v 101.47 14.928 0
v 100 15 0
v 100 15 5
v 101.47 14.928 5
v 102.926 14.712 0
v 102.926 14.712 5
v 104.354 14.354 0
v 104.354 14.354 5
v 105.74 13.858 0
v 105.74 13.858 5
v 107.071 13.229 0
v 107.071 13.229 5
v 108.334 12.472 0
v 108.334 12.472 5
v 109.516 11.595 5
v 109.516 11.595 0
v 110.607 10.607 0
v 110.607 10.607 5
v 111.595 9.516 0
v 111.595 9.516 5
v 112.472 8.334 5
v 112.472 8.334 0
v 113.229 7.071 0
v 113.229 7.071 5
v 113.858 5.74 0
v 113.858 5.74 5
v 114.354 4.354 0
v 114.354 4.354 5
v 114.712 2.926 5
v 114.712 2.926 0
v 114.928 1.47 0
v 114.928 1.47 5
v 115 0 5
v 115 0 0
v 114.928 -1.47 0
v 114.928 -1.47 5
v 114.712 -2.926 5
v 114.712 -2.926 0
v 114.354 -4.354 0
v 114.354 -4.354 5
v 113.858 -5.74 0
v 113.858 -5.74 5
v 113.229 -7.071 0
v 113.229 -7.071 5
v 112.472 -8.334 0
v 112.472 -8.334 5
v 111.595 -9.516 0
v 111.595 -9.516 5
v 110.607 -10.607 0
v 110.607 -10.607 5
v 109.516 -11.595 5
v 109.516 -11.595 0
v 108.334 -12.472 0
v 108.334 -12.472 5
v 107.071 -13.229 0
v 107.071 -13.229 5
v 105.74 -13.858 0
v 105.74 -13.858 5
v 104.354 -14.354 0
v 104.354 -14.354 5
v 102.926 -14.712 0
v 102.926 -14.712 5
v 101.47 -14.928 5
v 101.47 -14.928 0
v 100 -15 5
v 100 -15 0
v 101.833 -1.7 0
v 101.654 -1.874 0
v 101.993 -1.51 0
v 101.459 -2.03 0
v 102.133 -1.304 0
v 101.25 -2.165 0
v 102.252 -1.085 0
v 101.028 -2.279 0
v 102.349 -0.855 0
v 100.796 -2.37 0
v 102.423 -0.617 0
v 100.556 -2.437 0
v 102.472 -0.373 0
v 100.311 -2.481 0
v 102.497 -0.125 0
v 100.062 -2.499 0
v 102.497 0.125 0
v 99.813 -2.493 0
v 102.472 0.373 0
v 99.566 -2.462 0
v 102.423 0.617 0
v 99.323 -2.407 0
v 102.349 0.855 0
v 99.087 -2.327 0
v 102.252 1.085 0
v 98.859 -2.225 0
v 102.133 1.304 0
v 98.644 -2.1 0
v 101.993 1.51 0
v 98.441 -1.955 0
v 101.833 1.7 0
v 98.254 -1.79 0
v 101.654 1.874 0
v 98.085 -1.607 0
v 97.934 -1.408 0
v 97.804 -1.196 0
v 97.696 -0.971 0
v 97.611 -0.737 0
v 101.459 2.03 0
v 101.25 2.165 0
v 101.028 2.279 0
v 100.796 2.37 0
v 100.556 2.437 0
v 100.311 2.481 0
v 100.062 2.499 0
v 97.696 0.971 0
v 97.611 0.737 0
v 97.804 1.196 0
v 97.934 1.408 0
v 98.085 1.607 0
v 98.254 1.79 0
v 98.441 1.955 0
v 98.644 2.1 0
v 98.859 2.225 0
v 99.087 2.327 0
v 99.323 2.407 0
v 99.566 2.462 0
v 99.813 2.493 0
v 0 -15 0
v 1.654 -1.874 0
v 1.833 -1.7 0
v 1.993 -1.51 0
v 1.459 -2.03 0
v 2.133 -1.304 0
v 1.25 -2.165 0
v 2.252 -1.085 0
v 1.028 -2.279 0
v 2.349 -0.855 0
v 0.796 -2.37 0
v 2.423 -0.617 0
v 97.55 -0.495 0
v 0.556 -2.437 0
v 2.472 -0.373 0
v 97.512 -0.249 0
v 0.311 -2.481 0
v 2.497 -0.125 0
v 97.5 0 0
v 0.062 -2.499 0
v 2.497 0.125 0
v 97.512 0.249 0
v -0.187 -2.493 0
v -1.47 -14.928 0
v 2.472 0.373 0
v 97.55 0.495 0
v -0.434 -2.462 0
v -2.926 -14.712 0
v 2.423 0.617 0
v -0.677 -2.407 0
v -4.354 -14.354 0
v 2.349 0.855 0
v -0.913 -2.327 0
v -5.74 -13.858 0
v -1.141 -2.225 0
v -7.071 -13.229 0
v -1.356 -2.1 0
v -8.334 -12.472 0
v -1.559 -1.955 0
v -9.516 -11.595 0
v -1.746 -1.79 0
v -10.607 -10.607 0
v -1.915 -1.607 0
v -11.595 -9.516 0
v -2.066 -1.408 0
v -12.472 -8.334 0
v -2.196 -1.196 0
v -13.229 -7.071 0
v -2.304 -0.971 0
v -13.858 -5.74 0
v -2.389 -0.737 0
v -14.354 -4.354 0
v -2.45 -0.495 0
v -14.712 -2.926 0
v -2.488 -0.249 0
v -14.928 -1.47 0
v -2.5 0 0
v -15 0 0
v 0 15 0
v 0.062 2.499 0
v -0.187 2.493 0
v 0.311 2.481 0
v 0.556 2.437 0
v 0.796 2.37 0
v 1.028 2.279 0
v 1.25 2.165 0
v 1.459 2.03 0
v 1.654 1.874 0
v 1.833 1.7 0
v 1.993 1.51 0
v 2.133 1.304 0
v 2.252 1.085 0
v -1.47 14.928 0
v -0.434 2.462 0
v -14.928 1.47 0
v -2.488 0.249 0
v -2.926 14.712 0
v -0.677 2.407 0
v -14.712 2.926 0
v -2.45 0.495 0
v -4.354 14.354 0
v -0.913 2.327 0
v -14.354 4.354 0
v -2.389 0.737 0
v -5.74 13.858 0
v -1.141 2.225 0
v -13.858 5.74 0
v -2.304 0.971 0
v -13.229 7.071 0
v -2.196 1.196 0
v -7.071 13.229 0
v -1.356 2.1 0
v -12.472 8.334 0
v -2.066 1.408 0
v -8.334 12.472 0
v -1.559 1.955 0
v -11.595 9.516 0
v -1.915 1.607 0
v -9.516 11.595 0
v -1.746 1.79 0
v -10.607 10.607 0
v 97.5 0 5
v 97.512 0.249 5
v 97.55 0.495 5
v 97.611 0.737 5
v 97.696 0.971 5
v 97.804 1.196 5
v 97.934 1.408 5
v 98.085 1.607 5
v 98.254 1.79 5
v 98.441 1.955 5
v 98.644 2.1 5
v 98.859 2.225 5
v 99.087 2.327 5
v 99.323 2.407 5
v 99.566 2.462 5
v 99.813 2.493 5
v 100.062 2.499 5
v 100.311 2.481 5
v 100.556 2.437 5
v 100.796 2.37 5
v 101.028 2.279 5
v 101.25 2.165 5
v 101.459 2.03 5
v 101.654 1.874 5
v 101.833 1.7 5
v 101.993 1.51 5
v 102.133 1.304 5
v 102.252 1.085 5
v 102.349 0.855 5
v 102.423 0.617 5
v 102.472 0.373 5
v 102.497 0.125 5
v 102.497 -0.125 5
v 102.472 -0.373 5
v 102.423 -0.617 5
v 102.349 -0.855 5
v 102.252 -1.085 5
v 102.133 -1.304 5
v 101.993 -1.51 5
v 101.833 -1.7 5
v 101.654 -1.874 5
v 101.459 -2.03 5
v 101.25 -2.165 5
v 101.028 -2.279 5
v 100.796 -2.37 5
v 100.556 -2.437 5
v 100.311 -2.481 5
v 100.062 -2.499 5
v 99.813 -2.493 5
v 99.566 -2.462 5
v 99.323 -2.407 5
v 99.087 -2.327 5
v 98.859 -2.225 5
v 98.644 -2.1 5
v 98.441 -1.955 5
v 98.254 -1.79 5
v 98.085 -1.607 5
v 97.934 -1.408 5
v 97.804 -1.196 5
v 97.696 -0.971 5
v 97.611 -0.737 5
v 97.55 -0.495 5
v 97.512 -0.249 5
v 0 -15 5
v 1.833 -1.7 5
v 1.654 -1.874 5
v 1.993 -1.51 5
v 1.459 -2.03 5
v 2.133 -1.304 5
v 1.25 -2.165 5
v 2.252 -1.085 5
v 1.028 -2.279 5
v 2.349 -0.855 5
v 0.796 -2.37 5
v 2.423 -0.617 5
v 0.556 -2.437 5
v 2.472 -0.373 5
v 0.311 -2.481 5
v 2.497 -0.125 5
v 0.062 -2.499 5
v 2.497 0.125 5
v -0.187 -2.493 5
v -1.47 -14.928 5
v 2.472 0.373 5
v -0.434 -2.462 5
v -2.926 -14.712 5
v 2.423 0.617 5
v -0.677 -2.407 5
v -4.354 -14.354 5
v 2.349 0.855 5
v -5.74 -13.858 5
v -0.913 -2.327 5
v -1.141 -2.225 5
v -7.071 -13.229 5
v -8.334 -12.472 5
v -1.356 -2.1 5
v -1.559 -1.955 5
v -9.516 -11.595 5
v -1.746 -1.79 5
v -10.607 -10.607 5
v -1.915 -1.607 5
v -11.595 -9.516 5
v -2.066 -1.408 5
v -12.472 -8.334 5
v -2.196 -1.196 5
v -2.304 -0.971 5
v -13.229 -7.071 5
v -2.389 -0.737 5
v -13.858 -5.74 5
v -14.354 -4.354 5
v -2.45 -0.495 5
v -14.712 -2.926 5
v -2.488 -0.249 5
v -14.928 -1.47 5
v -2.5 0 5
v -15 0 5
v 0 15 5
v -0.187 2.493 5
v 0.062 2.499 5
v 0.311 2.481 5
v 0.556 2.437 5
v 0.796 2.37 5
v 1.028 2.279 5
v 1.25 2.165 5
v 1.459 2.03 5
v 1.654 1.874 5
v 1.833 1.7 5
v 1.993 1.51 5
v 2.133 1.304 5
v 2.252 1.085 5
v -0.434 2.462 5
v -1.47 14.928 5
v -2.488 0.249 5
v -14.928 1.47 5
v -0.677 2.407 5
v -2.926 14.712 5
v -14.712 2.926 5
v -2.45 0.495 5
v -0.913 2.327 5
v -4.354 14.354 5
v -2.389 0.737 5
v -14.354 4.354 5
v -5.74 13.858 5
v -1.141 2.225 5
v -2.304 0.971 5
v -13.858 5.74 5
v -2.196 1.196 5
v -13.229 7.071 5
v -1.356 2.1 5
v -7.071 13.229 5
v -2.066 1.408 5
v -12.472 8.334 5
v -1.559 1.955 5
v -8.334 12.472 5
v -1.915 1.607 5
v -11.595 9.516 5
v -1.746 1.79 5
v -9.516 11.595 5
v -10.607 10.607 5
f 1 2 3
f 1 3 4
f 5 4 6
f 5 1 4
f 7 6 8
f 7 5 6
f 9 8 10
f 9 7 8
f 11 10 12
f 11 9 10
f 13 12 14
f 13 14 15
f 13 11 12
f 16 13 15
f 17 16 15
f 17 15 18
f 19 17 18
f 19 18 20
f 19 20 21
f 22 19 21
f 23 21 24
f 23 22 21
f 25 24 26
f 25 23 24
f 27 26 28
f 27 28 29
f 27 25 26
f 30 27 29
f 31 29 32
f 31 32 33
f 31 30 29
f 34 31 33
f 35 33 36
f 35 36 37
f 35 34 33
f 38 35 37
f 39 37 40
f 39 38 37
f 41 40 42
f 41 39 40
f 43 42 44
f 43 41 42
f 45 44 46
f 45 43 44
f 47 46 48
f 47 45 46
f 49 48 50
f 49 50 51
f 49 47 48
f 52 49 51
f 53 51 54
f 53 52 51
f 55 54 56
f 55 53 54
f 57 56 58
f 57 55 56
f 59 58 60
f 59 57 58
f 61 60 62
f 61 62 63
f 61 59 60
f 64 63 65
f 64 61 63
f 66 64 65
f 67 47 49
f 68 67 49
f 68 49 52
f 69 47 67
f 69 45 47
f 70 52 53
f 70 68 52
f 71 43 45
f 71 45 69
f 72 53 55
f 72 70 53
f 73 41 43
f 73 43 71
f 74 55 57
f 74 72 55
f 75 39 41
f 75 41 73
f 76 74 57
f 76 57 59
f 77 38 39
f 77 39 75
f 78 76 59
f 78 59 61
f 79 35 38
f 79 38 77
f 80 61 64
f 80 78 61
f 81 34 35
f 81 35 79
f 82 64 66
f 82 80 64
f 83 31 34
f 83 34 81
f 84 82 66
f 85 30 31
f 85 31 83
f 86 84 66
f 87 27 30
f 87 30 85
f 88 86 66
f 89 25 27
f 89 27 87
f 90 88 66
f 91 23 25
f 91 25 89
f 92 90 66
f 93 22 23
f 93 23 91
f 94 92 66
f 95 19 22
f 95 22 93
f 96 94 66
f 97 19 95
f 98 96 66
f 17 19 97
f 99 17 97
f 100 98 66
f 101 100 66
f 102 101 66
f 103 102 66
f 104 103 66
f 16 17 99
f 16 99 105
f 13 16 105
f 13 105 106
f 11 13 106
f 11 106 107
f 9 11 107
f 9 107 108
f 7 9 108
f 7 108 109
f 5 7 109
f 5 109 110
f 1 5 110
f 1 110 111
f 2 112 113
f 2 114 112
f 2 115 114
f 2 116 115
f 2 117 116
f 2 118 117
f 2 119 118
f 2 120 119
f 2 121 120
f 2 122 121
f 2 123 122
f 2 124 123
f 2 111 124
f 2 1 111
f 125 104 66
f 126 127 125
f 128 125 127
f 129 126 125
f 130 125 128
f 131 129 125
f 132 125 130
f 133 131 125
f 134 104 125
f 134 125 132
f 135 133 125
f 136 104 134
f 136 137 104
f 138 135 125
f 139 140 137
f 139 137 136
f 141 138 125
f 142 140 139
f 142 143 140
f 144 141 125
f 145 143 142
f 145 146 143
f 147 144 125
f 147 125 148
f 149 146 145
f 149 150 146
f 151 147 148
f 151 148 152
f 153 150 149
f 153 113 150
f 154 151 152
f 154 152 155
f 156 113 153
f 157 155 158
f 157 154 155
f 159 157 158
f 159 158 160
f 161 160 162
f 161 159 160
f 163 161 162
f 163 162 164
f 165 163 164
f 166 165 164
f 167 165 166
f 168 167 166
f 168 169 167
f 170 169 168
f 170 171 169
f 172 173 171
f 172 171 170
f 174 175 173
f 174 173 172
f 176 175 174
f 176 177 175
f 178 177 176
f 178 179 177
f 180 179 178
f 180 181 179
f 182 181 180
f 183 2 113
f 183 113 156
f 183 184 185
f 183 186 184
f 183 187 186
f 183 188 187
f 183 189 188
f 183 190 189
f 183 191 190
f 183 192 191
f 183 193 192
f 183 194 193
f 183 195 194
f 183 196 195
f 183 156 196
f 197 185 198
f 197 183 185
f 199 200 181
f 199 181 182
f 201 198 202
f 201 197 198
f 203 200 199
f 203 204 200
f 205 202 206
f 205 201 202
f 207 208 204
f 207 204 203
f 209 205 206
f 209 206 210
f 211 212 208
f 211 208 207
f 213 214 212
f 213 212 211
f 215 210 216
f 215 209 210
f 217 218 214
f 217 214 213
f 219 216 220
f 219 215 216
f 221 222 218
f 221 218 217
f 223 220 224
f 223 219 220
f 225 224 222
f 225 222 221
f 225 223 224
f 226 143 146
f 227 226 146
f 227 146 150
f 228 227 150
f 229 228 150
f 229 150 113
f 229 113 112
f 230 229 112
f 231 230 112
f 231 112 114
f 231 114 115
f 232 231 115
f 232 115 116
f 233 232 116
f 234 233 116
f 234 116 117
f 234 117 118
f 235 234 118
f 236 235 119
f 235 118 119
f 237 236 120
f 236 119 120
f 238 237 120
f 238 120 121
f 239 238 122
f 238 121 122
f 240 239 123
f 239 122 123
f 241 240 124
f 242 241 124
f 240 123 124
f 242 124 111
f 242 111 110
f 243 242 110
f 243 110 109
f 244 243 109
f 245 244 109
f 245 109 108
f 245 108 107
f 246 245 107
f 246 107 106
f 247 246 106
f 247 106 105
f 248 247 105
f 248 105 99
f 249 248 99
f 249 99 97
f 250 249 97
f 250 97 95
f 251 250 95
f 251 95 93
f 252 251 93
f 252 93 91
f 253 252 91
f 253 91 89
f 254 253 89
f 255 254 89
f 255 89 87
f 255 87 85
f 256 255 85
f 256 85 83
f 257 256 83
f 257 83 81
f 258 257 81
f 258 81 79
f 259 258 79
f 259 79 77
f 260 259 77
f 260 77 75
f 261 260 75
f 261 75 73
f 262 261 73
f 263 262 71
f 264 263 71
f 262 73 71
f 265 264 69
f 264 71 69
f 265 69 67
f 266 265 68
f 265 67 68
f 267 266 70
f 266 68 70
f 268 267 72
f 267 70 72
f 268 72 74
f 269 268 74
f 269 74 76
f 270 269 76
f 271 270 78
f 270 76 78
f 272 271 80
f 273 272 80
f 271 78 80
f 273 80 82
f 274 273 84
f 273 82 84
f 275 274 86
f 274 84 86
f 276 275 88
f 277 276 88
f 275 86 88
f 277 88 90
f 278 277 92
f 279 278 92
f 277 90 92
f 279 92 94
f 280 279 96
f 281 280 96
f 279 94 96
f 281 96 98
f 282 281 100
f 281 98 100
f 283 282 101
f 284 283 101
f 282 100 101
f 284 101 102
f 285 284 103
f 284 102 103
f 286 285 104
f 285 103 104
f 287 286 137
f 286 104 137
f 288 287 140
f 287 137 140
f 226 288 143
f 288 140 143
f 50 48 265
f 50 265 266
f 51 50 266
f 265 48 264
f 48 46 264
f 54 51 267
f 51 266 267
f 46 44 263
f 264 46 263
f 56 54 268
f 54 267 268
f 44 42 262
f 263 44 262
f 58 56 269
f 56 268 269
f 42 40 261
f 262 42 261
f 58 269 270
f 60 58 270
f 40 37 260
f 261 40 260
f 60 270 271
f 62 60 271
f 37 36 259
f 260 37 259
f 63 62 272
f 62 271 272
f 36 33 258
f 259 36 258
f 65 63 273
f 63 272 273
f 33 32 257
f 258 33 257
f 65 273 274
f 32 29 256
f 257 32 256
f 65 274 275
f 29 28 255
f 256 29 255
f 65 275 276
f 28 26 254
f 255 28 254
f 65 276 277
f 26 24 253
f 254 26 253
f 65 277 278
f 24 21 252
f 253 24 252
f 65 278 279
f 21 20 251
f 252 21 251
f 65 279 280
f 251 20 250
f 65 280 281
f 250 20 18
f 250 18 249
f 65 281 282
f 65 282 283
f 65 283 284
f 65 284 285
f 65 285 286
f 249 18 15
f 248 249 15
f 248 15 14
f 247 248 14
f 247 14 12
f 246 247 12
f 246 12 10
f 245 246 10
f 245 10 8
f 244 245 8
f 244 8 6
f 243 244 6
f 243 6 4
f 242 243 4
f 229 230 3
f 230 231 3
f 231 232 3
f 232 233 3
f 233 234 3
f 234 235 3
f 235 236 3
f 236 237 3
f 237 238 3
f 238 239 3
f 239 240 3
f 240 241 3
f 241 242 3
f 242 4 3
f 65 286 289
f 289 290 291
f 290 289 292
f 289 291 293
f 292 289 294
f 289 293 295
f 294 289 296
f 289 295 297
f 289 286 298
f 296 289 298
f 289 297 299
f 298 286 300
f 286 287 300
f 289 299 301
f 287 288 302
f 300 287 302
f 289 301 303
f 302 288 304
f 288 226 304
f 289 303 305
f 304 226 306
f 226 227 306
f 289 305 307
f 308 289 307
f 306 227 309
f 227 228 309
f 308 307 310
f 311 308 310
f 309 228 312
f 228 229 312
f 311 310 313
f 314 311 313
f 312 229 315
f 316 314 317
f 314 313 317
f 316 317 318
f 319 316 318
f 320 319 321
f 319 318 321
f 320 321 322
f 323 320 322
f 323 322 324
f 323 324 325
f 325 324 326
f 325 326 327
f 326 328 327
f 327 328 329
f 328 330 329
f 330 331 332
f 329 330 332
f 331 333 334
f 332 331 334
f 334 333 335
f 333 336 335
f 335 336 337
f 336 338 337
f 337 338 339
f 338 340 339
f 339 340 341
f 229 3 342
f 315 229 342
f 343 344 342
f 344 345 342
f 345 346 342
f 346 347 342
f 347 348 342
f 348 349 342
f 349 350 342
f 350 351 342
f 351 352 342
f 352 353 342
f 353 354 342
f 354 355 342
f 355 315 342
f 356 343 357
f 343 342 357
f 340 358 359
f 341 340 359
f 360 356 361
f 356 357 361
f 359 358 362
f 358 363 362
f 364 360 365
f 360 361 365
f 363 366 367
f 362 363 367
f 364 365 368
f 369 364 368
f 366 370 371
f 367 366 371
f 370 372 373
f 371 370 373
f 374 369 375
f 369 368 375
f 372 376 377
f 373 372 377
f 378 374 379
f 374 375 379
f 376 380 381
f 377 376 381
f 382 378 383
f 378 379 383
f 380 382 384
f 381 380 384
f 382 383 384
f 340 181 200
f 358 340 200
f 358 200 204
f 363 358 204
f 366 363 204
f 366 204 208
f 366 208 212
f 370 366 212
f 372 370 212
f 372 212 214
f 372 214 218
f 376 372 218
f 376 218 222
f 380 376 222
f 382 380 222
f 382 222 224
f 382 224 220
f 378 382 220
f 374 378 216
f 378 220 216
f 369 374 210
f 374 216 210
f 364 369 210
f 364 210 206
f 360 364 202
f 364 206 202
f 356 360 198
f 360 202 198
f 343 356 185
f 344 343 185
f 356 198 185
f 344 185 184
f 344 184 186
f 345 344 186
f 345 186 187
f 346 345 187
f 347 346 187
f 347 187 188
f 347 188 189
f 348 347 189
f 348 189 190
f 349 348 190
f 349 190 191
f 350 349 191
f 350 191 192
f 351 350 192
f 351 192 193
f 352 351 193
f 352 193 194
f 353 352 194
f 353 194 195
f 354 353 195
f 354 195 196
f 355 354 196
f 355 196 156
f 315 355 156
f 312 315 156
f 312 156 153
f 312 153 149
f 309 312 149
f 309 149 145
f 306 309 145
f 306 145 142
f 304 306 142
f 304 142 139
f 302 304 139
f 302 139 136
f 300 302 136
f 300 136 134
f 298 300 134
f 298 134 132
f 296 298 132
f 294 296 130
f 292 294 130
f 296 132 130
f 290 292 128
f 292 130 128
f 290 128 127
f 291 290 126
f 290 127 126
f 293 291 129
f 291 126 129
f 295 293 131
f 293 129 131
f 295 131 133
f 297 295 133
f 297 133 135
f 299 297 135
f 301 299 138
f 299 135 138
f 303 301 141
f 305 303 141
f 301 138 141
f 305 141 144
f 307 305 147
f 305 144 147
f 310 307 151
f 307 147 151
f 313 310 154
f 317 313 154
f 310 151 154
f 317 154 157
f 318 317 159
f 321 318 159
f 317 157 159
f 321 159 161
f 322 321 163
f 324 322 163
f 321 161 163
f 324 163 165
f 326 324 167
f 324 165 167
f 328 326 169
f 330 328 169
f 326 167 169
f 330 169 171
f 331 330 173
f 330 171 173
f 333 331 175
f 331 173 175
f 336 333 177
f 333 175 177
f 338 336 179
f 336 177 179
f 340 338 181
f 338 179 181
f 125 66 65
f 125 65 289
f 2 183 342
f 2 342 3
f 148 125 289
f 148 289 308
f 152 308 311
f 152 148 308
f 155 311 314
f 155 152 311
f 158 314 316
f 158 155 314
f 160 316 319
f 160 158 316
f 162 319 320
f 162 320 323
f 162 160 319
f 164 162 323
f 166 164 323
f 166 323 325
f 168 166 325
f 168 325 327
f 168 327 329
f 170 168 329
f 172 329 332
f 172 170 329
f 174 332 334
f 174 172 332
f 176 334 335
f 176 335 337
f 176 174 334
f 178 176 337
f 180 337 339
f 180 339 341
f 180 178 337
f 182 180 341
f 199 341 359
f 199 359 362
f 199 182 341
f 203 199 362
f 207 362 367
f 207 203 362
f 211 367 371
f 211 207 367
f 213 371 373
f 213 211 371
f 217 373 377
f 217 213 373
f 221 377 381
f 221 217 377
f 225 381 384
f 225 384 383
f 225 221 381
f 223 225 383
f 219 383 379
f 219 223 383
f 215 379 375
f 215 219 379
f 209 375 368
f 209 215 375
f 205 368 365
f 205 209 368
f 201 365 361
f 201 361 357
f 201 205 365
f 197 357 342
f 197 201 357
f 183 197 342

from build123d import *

# Parameters (mm, degrees)
EXTRUDE_1_DEPTH     = 5
SKETCH_2_R          = 2.5
CUT_EXTRUDE_1_DEPTH = 117.081867662


with BuildPart() as part:
    # 草图1 → 凸台-拉伸1 (new body)
    with BuildSketch(Plane.XY):
        with BuildLine():
            Line((0, 15), (100, 15))
            ThreePointArc((100, 15), (115, 0), (100, -15))
            Line((100, -15), (0, -15))
            ThreePointArc((0, -15), (-15, 0), (0, 15))
        make_face()
    extrude(amount=EXTRUDE_1_DEPTH)

    # 草图2 → 切除-拉伸1 (cut, through all)
    with BuildSketch(Plane(origin=(0, 0, 0), x_dir=(-1, 0, 0), z_dir=(0, 0, -1))):
        Circle(SKETCH_2_R)
        with Locations((-100, 0)):
            Circle(SKETCH_2_R)
    extrude(amount=-CUT_EXTRUDE_1_DEPTH, mode=Mode.SUBTRACT)


solid = part.part
